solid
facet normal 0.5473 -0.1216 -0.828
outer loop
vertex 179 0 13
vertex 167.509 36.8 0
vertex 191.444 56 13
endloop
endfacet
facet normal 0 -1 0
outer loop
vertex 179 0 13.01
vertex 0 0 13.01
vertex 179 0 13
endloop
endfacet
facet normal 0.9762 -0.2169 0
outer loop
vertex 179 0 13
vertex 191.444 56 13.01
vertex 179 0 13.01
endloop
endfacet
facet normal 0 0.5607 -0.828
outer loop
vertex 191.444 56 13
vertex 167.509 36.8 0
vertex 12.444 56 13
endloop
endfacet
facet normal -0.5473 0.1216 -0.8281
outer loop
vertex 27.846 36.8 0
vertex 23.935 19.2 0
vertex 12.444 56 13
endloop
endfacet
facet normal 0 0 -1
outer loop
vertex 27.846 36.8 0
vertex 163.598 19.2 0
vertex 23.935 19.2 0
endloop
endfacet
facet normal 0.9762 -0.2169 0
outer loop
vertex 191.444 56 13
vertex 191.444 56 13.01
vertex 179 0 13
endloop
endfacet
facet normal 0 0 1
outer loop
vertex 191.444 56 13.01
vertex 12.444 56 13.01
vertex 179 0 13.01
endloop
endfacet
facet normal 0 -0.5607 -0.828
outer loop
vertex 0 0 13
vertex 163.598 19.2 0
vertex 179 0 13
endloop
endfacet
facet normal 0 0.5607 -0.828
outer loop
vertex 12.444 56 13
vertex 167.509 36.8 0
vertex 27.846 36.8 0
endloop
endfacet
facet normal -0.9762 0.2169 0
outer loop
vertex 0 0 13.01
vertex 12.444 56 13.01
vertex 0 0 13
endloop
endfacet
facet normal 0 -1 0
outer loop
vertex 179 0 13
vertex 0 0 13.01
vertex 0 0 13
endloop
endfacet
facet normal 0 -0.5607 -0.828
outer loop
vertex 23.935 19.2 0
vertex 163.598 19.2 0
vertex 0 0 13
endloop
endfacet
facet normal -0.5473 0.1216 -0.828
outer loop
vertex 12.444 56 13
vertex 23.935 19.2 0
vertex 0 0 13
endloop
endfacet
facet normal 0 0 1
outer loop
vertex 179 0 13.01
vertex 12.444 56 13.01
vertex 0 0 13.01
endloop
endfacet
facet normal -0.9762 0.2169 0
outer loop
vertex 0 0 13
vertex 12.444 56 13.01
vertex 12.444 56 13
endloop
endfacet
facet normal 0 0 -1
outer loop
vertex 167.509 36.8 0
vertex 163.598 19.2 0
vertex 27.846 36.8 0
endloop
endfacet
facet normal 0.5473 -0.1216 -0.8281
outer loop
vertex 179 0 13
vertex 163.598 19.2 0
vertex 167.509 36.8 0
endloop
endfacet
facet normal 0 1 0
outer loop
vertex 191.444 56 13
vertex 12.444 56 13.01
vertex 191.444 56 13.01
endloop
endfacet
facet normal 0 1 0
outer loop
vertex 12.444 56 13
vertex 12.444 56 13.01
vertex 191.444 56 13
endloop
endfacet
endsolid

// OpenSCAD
// file: ../util/util.scad
module threadedInsert() {
    cylinder(h=Threaded_insert_height, d=Threaded_insert_width, $fn=50);
}

module bezelCutout(length, width) {    
    linear_extrude(length)
        polygon([
            [0,0],
            [width+.4,0],
            [width,1],
            [0.4,1]
        ]);
}

module columnScrewCutout(totalLength, shankLength) {
    union() {
        cylinder(h=shankLength, d=boltHeadD, $fn=50);
        cylinder(h=totalLength, d=boltThreadD, $fn=50);
        
        // The fudge number here is required, otherwise the
        // shank face gets rendered and the relief is hidden.
        translate([0,0,shankLength-0.01])
            intersection() {
                cylinder(h=shankLength, d=boltHeadD, $fn=50);
                
                cube([boltHeadD,boltThreadD,0.4], center=true);
            }
    }
}

module columnScrewCutoutPair(columnDepth, columnHeight, riseOverRun, shankDepth) {
    
    translate([0,0,(columnHeight/3)*2])
        rotate([0,90,0])
            columnScrewCutout(columnDepth+(columnHeight/riseOverRun),shankDepth+(((columnHeight/3)*2)/riseOverRun));

    translate([0,0,columnHeight/3])
        rotate([0,90,0])
            columnScrewCutout(columnDepth+(columnHeight/riseOverRun),shankDepth+((columnHeight/3)/riseOverRun));
}
// file: basePanels.scad
include <../util/util.scad>

module panelThreadedInsertLeft(panelDepth, panelHeight, riseOverRun, bossDiameter) {
    
    translate([((panelHeight/3)*2)/riseOverRun,(panelHeight/3)*2,panelDepth/2])
        rotate([0,90,0])
            union() {
                translate([0,0,(bossDiameter/riseOverRun)/2])
                    threadedInsert();
                translate([0,0,-1*(bossDiameter/riseOverRun)/2])
                    cylinder(h=bossDiameter/riseOverRun, d=bossDiameter, $fn=50);
            }

    translate([(panelHeight/3)/riseOverRun,panelHeight/3,panelDepth/2])
        rotate([0,90,0])
            union() {
                translate([0,0,(bossDiameter/riseOverRun)/2])
                    threadedInsert();
                translate([0,0,-1*(bossDiameter/riseOverRun)/2])
                    cylinder(h=bossDiameter/riseOverRun, d=bossDiameter, $fn=50);
            }
}

module panelThreadedInsertRight(panelDepth, panelHeight, riseOverRun, bossDiameter) {
    translate([((panelHeight/3)*2)/riseOverRun,(panelHeight/3)*2,panelDepth/2])
        rotate([0,-90,0])
            union() {
                translate([0,0,(bossDiameter/riseOverRun)/2])
                    threadedInsert();
                translate([0,0,-1*(bossDiameter/riseOverRun)/2])
                    cylinder(h=bossDiameter/riseOverRun, d=bossDiameter, $fn=50);
            }
    
    translate([(panelHeight/3)/riseOverRun,panelHeight/3,panelDepth/2])
        rotate([0,-90,0])
            union() {
                translate([0,0,(bossDiameter/riseOverRun)/2])
                    threadedInsert();
                translate([0,0,-1*(bossDiameter/riseOverRun)/2])
                    cylinder(h=bossDiameter/riseOverRun, d=bossDiameter, $fn=50);
            }
}


module parallelogramFrustum(width, height, depth, riseOverRun, outset) {
    hull() {
        translate([0,0,depth])
            linear_extrude(0.01)
                parallelogram(width, height, riseOverRun);

        linear_extrude(0.01)
            offset(delta=outset)
        parallelogram(width, height, riseOverRun);
    }
}

module panelBase(panelW, panelH, shapeW, shapeH, riseOverRun, spaceX, spaceY, border, panelD) {
    union() {
        translate([border,0,0])
            linear_extrude(panelD)
                parallelogram(shapeW, panelH, riseOverRun);

        linear_extrude(panelD)
        parallelogramPanelWithFrame(panelW, panelH, shapeW, shapeH, riseOverRun, spaceX, spaceY, border);

        translate([panelW-border-shapeW,0,0])
            linear_extrude(panelD)
                parallelogram(shapeW, panelH, riseOverRun);
    }
}

module panel(panelW, panelH, shapeW, shapeH, riseOverRun, spaceX, spaceY, border, panelD) {
    
    difference() {
        panelBase(panelW, panelH, shapeW, shapeH, riseOverRun, spaceX, spaceY, border, panelD);
        
        // This is complicated because we have to match the slope on the X axis, not just the boarder.
        translate([border+border*2/(panelH/riseOverRun),border,2])
        parallelogramFrustum(panelW-border*2, panelH-border*2, panelD-2, riseOverRun, -1*shapeH*2);
        
        panelThreadedInsertLeft(panelD, panelH, riseOverRun, panelD*0.75);

        translate([panelW,0,0])
            panelThreadedInsertRight(panelD, panelH, riseOverRun, panelD*0.75);
    }
} 
// file: ../parallelograms/parallelograms.scad
module parallelogram(w, h, riseOverRun) {
    slant = h/riseOverRun;
    polygon([
        [0,0],
        [slant,h],
        [w+slant,h],
        [w,0],
    ]);
}

module parallelogramArray(panelW, panelH, shapeW, shapeH, riseOverRun, spaceX, spaceY) {
    offsetX = shapeW+spaceX;
    offsetY = shapeH+spaceY;
    for(y = [0:offsetY:panelH+offsetY]) {
        translate([y/riseOverRun,0,0]) {
            for(x = [0:offsetX:panelW+offsetX]) {
                translate([x, y, 0]) parallelogram(shapeW, shapeH, riseOverRun);
            }
        }
    }
}

module parallelogramGrid(panelW, panelH, shapeW, shapeH, riseOverRun, spaceX, spaceY) {
    difference() {
        parallelogram(panelW, panelH, riseOverRun);
        
        parallelogramArray(panelW, panelH, shapeW, shapeH, riseOverRun, spaceX, spaceY);
    }
}

module parallelogramFrame(panelW, panelH, riseOverRun, border) {
    difference() {
        parallelogram(panelW, panelH, riseOverRun);
        
        offset(delta=border*-1)
            parallelogram(panelW, panelH, riseOverRun);
    }
}

module parallelogramPanelWithFrame(panelW, panelH, shapeW, shapeH, riseOverRun, spaceX, spaceY, border) {
    
    union() {
        parallelogramFrame(panelW, panelH, riseOverRun, border);
        
        translate([border, border])
            parallelogramGrid(panelW-border, panelH-border, shapeW, shapeH, riseOverRun, spaceX, spaceY);
    }
}
// main file
include <../parallelograms/parallelograms.scad>
include <basePanels.scad>

/* [Parallelogram Shape] */
Rise = 9;
Run = 2;
ShapeW = 10.2;
ShapeH = 9.6;
riseOverRun = Rise/Run;

/* [Panel] */
PanelW = 183;
PanelH = 60;
SpaceX = 2;
SpaceY = 2;
Border = 2;
PanelZ = 15;

/* [Threaded inserts & hardware] */
Threaded_insert_width=4.8;
Threaded_insert_height=5;
boltThreadD=3.8;
boltHeadD=Threaded_insert_width+2;

/* [Preview] */
Select = 0; // [0:parallelogramFrustum, 1:panelBase, 2:panel]

if (Select==0) {
    parallelogramFrustum(PanelW-Border*2, PanelH-Border*2, PanelZ-2, riseOverRun, -1*ShapeH*2);
} else if (Select==1) {
    panelBase(PanelW, PanelH, ShapeW, ShapeH, riseOverRun, SpaceX, SpaceY, Border, PanelZ);
} else if (Select==2) {
    panel(PanelW, PanelH, ShapeW, ShapeH, riseOverRun, SpaceX, SpaceY, Border, PanelZ);
} else if (Select==3) {
    
} else if (Select==4) {
    
}
